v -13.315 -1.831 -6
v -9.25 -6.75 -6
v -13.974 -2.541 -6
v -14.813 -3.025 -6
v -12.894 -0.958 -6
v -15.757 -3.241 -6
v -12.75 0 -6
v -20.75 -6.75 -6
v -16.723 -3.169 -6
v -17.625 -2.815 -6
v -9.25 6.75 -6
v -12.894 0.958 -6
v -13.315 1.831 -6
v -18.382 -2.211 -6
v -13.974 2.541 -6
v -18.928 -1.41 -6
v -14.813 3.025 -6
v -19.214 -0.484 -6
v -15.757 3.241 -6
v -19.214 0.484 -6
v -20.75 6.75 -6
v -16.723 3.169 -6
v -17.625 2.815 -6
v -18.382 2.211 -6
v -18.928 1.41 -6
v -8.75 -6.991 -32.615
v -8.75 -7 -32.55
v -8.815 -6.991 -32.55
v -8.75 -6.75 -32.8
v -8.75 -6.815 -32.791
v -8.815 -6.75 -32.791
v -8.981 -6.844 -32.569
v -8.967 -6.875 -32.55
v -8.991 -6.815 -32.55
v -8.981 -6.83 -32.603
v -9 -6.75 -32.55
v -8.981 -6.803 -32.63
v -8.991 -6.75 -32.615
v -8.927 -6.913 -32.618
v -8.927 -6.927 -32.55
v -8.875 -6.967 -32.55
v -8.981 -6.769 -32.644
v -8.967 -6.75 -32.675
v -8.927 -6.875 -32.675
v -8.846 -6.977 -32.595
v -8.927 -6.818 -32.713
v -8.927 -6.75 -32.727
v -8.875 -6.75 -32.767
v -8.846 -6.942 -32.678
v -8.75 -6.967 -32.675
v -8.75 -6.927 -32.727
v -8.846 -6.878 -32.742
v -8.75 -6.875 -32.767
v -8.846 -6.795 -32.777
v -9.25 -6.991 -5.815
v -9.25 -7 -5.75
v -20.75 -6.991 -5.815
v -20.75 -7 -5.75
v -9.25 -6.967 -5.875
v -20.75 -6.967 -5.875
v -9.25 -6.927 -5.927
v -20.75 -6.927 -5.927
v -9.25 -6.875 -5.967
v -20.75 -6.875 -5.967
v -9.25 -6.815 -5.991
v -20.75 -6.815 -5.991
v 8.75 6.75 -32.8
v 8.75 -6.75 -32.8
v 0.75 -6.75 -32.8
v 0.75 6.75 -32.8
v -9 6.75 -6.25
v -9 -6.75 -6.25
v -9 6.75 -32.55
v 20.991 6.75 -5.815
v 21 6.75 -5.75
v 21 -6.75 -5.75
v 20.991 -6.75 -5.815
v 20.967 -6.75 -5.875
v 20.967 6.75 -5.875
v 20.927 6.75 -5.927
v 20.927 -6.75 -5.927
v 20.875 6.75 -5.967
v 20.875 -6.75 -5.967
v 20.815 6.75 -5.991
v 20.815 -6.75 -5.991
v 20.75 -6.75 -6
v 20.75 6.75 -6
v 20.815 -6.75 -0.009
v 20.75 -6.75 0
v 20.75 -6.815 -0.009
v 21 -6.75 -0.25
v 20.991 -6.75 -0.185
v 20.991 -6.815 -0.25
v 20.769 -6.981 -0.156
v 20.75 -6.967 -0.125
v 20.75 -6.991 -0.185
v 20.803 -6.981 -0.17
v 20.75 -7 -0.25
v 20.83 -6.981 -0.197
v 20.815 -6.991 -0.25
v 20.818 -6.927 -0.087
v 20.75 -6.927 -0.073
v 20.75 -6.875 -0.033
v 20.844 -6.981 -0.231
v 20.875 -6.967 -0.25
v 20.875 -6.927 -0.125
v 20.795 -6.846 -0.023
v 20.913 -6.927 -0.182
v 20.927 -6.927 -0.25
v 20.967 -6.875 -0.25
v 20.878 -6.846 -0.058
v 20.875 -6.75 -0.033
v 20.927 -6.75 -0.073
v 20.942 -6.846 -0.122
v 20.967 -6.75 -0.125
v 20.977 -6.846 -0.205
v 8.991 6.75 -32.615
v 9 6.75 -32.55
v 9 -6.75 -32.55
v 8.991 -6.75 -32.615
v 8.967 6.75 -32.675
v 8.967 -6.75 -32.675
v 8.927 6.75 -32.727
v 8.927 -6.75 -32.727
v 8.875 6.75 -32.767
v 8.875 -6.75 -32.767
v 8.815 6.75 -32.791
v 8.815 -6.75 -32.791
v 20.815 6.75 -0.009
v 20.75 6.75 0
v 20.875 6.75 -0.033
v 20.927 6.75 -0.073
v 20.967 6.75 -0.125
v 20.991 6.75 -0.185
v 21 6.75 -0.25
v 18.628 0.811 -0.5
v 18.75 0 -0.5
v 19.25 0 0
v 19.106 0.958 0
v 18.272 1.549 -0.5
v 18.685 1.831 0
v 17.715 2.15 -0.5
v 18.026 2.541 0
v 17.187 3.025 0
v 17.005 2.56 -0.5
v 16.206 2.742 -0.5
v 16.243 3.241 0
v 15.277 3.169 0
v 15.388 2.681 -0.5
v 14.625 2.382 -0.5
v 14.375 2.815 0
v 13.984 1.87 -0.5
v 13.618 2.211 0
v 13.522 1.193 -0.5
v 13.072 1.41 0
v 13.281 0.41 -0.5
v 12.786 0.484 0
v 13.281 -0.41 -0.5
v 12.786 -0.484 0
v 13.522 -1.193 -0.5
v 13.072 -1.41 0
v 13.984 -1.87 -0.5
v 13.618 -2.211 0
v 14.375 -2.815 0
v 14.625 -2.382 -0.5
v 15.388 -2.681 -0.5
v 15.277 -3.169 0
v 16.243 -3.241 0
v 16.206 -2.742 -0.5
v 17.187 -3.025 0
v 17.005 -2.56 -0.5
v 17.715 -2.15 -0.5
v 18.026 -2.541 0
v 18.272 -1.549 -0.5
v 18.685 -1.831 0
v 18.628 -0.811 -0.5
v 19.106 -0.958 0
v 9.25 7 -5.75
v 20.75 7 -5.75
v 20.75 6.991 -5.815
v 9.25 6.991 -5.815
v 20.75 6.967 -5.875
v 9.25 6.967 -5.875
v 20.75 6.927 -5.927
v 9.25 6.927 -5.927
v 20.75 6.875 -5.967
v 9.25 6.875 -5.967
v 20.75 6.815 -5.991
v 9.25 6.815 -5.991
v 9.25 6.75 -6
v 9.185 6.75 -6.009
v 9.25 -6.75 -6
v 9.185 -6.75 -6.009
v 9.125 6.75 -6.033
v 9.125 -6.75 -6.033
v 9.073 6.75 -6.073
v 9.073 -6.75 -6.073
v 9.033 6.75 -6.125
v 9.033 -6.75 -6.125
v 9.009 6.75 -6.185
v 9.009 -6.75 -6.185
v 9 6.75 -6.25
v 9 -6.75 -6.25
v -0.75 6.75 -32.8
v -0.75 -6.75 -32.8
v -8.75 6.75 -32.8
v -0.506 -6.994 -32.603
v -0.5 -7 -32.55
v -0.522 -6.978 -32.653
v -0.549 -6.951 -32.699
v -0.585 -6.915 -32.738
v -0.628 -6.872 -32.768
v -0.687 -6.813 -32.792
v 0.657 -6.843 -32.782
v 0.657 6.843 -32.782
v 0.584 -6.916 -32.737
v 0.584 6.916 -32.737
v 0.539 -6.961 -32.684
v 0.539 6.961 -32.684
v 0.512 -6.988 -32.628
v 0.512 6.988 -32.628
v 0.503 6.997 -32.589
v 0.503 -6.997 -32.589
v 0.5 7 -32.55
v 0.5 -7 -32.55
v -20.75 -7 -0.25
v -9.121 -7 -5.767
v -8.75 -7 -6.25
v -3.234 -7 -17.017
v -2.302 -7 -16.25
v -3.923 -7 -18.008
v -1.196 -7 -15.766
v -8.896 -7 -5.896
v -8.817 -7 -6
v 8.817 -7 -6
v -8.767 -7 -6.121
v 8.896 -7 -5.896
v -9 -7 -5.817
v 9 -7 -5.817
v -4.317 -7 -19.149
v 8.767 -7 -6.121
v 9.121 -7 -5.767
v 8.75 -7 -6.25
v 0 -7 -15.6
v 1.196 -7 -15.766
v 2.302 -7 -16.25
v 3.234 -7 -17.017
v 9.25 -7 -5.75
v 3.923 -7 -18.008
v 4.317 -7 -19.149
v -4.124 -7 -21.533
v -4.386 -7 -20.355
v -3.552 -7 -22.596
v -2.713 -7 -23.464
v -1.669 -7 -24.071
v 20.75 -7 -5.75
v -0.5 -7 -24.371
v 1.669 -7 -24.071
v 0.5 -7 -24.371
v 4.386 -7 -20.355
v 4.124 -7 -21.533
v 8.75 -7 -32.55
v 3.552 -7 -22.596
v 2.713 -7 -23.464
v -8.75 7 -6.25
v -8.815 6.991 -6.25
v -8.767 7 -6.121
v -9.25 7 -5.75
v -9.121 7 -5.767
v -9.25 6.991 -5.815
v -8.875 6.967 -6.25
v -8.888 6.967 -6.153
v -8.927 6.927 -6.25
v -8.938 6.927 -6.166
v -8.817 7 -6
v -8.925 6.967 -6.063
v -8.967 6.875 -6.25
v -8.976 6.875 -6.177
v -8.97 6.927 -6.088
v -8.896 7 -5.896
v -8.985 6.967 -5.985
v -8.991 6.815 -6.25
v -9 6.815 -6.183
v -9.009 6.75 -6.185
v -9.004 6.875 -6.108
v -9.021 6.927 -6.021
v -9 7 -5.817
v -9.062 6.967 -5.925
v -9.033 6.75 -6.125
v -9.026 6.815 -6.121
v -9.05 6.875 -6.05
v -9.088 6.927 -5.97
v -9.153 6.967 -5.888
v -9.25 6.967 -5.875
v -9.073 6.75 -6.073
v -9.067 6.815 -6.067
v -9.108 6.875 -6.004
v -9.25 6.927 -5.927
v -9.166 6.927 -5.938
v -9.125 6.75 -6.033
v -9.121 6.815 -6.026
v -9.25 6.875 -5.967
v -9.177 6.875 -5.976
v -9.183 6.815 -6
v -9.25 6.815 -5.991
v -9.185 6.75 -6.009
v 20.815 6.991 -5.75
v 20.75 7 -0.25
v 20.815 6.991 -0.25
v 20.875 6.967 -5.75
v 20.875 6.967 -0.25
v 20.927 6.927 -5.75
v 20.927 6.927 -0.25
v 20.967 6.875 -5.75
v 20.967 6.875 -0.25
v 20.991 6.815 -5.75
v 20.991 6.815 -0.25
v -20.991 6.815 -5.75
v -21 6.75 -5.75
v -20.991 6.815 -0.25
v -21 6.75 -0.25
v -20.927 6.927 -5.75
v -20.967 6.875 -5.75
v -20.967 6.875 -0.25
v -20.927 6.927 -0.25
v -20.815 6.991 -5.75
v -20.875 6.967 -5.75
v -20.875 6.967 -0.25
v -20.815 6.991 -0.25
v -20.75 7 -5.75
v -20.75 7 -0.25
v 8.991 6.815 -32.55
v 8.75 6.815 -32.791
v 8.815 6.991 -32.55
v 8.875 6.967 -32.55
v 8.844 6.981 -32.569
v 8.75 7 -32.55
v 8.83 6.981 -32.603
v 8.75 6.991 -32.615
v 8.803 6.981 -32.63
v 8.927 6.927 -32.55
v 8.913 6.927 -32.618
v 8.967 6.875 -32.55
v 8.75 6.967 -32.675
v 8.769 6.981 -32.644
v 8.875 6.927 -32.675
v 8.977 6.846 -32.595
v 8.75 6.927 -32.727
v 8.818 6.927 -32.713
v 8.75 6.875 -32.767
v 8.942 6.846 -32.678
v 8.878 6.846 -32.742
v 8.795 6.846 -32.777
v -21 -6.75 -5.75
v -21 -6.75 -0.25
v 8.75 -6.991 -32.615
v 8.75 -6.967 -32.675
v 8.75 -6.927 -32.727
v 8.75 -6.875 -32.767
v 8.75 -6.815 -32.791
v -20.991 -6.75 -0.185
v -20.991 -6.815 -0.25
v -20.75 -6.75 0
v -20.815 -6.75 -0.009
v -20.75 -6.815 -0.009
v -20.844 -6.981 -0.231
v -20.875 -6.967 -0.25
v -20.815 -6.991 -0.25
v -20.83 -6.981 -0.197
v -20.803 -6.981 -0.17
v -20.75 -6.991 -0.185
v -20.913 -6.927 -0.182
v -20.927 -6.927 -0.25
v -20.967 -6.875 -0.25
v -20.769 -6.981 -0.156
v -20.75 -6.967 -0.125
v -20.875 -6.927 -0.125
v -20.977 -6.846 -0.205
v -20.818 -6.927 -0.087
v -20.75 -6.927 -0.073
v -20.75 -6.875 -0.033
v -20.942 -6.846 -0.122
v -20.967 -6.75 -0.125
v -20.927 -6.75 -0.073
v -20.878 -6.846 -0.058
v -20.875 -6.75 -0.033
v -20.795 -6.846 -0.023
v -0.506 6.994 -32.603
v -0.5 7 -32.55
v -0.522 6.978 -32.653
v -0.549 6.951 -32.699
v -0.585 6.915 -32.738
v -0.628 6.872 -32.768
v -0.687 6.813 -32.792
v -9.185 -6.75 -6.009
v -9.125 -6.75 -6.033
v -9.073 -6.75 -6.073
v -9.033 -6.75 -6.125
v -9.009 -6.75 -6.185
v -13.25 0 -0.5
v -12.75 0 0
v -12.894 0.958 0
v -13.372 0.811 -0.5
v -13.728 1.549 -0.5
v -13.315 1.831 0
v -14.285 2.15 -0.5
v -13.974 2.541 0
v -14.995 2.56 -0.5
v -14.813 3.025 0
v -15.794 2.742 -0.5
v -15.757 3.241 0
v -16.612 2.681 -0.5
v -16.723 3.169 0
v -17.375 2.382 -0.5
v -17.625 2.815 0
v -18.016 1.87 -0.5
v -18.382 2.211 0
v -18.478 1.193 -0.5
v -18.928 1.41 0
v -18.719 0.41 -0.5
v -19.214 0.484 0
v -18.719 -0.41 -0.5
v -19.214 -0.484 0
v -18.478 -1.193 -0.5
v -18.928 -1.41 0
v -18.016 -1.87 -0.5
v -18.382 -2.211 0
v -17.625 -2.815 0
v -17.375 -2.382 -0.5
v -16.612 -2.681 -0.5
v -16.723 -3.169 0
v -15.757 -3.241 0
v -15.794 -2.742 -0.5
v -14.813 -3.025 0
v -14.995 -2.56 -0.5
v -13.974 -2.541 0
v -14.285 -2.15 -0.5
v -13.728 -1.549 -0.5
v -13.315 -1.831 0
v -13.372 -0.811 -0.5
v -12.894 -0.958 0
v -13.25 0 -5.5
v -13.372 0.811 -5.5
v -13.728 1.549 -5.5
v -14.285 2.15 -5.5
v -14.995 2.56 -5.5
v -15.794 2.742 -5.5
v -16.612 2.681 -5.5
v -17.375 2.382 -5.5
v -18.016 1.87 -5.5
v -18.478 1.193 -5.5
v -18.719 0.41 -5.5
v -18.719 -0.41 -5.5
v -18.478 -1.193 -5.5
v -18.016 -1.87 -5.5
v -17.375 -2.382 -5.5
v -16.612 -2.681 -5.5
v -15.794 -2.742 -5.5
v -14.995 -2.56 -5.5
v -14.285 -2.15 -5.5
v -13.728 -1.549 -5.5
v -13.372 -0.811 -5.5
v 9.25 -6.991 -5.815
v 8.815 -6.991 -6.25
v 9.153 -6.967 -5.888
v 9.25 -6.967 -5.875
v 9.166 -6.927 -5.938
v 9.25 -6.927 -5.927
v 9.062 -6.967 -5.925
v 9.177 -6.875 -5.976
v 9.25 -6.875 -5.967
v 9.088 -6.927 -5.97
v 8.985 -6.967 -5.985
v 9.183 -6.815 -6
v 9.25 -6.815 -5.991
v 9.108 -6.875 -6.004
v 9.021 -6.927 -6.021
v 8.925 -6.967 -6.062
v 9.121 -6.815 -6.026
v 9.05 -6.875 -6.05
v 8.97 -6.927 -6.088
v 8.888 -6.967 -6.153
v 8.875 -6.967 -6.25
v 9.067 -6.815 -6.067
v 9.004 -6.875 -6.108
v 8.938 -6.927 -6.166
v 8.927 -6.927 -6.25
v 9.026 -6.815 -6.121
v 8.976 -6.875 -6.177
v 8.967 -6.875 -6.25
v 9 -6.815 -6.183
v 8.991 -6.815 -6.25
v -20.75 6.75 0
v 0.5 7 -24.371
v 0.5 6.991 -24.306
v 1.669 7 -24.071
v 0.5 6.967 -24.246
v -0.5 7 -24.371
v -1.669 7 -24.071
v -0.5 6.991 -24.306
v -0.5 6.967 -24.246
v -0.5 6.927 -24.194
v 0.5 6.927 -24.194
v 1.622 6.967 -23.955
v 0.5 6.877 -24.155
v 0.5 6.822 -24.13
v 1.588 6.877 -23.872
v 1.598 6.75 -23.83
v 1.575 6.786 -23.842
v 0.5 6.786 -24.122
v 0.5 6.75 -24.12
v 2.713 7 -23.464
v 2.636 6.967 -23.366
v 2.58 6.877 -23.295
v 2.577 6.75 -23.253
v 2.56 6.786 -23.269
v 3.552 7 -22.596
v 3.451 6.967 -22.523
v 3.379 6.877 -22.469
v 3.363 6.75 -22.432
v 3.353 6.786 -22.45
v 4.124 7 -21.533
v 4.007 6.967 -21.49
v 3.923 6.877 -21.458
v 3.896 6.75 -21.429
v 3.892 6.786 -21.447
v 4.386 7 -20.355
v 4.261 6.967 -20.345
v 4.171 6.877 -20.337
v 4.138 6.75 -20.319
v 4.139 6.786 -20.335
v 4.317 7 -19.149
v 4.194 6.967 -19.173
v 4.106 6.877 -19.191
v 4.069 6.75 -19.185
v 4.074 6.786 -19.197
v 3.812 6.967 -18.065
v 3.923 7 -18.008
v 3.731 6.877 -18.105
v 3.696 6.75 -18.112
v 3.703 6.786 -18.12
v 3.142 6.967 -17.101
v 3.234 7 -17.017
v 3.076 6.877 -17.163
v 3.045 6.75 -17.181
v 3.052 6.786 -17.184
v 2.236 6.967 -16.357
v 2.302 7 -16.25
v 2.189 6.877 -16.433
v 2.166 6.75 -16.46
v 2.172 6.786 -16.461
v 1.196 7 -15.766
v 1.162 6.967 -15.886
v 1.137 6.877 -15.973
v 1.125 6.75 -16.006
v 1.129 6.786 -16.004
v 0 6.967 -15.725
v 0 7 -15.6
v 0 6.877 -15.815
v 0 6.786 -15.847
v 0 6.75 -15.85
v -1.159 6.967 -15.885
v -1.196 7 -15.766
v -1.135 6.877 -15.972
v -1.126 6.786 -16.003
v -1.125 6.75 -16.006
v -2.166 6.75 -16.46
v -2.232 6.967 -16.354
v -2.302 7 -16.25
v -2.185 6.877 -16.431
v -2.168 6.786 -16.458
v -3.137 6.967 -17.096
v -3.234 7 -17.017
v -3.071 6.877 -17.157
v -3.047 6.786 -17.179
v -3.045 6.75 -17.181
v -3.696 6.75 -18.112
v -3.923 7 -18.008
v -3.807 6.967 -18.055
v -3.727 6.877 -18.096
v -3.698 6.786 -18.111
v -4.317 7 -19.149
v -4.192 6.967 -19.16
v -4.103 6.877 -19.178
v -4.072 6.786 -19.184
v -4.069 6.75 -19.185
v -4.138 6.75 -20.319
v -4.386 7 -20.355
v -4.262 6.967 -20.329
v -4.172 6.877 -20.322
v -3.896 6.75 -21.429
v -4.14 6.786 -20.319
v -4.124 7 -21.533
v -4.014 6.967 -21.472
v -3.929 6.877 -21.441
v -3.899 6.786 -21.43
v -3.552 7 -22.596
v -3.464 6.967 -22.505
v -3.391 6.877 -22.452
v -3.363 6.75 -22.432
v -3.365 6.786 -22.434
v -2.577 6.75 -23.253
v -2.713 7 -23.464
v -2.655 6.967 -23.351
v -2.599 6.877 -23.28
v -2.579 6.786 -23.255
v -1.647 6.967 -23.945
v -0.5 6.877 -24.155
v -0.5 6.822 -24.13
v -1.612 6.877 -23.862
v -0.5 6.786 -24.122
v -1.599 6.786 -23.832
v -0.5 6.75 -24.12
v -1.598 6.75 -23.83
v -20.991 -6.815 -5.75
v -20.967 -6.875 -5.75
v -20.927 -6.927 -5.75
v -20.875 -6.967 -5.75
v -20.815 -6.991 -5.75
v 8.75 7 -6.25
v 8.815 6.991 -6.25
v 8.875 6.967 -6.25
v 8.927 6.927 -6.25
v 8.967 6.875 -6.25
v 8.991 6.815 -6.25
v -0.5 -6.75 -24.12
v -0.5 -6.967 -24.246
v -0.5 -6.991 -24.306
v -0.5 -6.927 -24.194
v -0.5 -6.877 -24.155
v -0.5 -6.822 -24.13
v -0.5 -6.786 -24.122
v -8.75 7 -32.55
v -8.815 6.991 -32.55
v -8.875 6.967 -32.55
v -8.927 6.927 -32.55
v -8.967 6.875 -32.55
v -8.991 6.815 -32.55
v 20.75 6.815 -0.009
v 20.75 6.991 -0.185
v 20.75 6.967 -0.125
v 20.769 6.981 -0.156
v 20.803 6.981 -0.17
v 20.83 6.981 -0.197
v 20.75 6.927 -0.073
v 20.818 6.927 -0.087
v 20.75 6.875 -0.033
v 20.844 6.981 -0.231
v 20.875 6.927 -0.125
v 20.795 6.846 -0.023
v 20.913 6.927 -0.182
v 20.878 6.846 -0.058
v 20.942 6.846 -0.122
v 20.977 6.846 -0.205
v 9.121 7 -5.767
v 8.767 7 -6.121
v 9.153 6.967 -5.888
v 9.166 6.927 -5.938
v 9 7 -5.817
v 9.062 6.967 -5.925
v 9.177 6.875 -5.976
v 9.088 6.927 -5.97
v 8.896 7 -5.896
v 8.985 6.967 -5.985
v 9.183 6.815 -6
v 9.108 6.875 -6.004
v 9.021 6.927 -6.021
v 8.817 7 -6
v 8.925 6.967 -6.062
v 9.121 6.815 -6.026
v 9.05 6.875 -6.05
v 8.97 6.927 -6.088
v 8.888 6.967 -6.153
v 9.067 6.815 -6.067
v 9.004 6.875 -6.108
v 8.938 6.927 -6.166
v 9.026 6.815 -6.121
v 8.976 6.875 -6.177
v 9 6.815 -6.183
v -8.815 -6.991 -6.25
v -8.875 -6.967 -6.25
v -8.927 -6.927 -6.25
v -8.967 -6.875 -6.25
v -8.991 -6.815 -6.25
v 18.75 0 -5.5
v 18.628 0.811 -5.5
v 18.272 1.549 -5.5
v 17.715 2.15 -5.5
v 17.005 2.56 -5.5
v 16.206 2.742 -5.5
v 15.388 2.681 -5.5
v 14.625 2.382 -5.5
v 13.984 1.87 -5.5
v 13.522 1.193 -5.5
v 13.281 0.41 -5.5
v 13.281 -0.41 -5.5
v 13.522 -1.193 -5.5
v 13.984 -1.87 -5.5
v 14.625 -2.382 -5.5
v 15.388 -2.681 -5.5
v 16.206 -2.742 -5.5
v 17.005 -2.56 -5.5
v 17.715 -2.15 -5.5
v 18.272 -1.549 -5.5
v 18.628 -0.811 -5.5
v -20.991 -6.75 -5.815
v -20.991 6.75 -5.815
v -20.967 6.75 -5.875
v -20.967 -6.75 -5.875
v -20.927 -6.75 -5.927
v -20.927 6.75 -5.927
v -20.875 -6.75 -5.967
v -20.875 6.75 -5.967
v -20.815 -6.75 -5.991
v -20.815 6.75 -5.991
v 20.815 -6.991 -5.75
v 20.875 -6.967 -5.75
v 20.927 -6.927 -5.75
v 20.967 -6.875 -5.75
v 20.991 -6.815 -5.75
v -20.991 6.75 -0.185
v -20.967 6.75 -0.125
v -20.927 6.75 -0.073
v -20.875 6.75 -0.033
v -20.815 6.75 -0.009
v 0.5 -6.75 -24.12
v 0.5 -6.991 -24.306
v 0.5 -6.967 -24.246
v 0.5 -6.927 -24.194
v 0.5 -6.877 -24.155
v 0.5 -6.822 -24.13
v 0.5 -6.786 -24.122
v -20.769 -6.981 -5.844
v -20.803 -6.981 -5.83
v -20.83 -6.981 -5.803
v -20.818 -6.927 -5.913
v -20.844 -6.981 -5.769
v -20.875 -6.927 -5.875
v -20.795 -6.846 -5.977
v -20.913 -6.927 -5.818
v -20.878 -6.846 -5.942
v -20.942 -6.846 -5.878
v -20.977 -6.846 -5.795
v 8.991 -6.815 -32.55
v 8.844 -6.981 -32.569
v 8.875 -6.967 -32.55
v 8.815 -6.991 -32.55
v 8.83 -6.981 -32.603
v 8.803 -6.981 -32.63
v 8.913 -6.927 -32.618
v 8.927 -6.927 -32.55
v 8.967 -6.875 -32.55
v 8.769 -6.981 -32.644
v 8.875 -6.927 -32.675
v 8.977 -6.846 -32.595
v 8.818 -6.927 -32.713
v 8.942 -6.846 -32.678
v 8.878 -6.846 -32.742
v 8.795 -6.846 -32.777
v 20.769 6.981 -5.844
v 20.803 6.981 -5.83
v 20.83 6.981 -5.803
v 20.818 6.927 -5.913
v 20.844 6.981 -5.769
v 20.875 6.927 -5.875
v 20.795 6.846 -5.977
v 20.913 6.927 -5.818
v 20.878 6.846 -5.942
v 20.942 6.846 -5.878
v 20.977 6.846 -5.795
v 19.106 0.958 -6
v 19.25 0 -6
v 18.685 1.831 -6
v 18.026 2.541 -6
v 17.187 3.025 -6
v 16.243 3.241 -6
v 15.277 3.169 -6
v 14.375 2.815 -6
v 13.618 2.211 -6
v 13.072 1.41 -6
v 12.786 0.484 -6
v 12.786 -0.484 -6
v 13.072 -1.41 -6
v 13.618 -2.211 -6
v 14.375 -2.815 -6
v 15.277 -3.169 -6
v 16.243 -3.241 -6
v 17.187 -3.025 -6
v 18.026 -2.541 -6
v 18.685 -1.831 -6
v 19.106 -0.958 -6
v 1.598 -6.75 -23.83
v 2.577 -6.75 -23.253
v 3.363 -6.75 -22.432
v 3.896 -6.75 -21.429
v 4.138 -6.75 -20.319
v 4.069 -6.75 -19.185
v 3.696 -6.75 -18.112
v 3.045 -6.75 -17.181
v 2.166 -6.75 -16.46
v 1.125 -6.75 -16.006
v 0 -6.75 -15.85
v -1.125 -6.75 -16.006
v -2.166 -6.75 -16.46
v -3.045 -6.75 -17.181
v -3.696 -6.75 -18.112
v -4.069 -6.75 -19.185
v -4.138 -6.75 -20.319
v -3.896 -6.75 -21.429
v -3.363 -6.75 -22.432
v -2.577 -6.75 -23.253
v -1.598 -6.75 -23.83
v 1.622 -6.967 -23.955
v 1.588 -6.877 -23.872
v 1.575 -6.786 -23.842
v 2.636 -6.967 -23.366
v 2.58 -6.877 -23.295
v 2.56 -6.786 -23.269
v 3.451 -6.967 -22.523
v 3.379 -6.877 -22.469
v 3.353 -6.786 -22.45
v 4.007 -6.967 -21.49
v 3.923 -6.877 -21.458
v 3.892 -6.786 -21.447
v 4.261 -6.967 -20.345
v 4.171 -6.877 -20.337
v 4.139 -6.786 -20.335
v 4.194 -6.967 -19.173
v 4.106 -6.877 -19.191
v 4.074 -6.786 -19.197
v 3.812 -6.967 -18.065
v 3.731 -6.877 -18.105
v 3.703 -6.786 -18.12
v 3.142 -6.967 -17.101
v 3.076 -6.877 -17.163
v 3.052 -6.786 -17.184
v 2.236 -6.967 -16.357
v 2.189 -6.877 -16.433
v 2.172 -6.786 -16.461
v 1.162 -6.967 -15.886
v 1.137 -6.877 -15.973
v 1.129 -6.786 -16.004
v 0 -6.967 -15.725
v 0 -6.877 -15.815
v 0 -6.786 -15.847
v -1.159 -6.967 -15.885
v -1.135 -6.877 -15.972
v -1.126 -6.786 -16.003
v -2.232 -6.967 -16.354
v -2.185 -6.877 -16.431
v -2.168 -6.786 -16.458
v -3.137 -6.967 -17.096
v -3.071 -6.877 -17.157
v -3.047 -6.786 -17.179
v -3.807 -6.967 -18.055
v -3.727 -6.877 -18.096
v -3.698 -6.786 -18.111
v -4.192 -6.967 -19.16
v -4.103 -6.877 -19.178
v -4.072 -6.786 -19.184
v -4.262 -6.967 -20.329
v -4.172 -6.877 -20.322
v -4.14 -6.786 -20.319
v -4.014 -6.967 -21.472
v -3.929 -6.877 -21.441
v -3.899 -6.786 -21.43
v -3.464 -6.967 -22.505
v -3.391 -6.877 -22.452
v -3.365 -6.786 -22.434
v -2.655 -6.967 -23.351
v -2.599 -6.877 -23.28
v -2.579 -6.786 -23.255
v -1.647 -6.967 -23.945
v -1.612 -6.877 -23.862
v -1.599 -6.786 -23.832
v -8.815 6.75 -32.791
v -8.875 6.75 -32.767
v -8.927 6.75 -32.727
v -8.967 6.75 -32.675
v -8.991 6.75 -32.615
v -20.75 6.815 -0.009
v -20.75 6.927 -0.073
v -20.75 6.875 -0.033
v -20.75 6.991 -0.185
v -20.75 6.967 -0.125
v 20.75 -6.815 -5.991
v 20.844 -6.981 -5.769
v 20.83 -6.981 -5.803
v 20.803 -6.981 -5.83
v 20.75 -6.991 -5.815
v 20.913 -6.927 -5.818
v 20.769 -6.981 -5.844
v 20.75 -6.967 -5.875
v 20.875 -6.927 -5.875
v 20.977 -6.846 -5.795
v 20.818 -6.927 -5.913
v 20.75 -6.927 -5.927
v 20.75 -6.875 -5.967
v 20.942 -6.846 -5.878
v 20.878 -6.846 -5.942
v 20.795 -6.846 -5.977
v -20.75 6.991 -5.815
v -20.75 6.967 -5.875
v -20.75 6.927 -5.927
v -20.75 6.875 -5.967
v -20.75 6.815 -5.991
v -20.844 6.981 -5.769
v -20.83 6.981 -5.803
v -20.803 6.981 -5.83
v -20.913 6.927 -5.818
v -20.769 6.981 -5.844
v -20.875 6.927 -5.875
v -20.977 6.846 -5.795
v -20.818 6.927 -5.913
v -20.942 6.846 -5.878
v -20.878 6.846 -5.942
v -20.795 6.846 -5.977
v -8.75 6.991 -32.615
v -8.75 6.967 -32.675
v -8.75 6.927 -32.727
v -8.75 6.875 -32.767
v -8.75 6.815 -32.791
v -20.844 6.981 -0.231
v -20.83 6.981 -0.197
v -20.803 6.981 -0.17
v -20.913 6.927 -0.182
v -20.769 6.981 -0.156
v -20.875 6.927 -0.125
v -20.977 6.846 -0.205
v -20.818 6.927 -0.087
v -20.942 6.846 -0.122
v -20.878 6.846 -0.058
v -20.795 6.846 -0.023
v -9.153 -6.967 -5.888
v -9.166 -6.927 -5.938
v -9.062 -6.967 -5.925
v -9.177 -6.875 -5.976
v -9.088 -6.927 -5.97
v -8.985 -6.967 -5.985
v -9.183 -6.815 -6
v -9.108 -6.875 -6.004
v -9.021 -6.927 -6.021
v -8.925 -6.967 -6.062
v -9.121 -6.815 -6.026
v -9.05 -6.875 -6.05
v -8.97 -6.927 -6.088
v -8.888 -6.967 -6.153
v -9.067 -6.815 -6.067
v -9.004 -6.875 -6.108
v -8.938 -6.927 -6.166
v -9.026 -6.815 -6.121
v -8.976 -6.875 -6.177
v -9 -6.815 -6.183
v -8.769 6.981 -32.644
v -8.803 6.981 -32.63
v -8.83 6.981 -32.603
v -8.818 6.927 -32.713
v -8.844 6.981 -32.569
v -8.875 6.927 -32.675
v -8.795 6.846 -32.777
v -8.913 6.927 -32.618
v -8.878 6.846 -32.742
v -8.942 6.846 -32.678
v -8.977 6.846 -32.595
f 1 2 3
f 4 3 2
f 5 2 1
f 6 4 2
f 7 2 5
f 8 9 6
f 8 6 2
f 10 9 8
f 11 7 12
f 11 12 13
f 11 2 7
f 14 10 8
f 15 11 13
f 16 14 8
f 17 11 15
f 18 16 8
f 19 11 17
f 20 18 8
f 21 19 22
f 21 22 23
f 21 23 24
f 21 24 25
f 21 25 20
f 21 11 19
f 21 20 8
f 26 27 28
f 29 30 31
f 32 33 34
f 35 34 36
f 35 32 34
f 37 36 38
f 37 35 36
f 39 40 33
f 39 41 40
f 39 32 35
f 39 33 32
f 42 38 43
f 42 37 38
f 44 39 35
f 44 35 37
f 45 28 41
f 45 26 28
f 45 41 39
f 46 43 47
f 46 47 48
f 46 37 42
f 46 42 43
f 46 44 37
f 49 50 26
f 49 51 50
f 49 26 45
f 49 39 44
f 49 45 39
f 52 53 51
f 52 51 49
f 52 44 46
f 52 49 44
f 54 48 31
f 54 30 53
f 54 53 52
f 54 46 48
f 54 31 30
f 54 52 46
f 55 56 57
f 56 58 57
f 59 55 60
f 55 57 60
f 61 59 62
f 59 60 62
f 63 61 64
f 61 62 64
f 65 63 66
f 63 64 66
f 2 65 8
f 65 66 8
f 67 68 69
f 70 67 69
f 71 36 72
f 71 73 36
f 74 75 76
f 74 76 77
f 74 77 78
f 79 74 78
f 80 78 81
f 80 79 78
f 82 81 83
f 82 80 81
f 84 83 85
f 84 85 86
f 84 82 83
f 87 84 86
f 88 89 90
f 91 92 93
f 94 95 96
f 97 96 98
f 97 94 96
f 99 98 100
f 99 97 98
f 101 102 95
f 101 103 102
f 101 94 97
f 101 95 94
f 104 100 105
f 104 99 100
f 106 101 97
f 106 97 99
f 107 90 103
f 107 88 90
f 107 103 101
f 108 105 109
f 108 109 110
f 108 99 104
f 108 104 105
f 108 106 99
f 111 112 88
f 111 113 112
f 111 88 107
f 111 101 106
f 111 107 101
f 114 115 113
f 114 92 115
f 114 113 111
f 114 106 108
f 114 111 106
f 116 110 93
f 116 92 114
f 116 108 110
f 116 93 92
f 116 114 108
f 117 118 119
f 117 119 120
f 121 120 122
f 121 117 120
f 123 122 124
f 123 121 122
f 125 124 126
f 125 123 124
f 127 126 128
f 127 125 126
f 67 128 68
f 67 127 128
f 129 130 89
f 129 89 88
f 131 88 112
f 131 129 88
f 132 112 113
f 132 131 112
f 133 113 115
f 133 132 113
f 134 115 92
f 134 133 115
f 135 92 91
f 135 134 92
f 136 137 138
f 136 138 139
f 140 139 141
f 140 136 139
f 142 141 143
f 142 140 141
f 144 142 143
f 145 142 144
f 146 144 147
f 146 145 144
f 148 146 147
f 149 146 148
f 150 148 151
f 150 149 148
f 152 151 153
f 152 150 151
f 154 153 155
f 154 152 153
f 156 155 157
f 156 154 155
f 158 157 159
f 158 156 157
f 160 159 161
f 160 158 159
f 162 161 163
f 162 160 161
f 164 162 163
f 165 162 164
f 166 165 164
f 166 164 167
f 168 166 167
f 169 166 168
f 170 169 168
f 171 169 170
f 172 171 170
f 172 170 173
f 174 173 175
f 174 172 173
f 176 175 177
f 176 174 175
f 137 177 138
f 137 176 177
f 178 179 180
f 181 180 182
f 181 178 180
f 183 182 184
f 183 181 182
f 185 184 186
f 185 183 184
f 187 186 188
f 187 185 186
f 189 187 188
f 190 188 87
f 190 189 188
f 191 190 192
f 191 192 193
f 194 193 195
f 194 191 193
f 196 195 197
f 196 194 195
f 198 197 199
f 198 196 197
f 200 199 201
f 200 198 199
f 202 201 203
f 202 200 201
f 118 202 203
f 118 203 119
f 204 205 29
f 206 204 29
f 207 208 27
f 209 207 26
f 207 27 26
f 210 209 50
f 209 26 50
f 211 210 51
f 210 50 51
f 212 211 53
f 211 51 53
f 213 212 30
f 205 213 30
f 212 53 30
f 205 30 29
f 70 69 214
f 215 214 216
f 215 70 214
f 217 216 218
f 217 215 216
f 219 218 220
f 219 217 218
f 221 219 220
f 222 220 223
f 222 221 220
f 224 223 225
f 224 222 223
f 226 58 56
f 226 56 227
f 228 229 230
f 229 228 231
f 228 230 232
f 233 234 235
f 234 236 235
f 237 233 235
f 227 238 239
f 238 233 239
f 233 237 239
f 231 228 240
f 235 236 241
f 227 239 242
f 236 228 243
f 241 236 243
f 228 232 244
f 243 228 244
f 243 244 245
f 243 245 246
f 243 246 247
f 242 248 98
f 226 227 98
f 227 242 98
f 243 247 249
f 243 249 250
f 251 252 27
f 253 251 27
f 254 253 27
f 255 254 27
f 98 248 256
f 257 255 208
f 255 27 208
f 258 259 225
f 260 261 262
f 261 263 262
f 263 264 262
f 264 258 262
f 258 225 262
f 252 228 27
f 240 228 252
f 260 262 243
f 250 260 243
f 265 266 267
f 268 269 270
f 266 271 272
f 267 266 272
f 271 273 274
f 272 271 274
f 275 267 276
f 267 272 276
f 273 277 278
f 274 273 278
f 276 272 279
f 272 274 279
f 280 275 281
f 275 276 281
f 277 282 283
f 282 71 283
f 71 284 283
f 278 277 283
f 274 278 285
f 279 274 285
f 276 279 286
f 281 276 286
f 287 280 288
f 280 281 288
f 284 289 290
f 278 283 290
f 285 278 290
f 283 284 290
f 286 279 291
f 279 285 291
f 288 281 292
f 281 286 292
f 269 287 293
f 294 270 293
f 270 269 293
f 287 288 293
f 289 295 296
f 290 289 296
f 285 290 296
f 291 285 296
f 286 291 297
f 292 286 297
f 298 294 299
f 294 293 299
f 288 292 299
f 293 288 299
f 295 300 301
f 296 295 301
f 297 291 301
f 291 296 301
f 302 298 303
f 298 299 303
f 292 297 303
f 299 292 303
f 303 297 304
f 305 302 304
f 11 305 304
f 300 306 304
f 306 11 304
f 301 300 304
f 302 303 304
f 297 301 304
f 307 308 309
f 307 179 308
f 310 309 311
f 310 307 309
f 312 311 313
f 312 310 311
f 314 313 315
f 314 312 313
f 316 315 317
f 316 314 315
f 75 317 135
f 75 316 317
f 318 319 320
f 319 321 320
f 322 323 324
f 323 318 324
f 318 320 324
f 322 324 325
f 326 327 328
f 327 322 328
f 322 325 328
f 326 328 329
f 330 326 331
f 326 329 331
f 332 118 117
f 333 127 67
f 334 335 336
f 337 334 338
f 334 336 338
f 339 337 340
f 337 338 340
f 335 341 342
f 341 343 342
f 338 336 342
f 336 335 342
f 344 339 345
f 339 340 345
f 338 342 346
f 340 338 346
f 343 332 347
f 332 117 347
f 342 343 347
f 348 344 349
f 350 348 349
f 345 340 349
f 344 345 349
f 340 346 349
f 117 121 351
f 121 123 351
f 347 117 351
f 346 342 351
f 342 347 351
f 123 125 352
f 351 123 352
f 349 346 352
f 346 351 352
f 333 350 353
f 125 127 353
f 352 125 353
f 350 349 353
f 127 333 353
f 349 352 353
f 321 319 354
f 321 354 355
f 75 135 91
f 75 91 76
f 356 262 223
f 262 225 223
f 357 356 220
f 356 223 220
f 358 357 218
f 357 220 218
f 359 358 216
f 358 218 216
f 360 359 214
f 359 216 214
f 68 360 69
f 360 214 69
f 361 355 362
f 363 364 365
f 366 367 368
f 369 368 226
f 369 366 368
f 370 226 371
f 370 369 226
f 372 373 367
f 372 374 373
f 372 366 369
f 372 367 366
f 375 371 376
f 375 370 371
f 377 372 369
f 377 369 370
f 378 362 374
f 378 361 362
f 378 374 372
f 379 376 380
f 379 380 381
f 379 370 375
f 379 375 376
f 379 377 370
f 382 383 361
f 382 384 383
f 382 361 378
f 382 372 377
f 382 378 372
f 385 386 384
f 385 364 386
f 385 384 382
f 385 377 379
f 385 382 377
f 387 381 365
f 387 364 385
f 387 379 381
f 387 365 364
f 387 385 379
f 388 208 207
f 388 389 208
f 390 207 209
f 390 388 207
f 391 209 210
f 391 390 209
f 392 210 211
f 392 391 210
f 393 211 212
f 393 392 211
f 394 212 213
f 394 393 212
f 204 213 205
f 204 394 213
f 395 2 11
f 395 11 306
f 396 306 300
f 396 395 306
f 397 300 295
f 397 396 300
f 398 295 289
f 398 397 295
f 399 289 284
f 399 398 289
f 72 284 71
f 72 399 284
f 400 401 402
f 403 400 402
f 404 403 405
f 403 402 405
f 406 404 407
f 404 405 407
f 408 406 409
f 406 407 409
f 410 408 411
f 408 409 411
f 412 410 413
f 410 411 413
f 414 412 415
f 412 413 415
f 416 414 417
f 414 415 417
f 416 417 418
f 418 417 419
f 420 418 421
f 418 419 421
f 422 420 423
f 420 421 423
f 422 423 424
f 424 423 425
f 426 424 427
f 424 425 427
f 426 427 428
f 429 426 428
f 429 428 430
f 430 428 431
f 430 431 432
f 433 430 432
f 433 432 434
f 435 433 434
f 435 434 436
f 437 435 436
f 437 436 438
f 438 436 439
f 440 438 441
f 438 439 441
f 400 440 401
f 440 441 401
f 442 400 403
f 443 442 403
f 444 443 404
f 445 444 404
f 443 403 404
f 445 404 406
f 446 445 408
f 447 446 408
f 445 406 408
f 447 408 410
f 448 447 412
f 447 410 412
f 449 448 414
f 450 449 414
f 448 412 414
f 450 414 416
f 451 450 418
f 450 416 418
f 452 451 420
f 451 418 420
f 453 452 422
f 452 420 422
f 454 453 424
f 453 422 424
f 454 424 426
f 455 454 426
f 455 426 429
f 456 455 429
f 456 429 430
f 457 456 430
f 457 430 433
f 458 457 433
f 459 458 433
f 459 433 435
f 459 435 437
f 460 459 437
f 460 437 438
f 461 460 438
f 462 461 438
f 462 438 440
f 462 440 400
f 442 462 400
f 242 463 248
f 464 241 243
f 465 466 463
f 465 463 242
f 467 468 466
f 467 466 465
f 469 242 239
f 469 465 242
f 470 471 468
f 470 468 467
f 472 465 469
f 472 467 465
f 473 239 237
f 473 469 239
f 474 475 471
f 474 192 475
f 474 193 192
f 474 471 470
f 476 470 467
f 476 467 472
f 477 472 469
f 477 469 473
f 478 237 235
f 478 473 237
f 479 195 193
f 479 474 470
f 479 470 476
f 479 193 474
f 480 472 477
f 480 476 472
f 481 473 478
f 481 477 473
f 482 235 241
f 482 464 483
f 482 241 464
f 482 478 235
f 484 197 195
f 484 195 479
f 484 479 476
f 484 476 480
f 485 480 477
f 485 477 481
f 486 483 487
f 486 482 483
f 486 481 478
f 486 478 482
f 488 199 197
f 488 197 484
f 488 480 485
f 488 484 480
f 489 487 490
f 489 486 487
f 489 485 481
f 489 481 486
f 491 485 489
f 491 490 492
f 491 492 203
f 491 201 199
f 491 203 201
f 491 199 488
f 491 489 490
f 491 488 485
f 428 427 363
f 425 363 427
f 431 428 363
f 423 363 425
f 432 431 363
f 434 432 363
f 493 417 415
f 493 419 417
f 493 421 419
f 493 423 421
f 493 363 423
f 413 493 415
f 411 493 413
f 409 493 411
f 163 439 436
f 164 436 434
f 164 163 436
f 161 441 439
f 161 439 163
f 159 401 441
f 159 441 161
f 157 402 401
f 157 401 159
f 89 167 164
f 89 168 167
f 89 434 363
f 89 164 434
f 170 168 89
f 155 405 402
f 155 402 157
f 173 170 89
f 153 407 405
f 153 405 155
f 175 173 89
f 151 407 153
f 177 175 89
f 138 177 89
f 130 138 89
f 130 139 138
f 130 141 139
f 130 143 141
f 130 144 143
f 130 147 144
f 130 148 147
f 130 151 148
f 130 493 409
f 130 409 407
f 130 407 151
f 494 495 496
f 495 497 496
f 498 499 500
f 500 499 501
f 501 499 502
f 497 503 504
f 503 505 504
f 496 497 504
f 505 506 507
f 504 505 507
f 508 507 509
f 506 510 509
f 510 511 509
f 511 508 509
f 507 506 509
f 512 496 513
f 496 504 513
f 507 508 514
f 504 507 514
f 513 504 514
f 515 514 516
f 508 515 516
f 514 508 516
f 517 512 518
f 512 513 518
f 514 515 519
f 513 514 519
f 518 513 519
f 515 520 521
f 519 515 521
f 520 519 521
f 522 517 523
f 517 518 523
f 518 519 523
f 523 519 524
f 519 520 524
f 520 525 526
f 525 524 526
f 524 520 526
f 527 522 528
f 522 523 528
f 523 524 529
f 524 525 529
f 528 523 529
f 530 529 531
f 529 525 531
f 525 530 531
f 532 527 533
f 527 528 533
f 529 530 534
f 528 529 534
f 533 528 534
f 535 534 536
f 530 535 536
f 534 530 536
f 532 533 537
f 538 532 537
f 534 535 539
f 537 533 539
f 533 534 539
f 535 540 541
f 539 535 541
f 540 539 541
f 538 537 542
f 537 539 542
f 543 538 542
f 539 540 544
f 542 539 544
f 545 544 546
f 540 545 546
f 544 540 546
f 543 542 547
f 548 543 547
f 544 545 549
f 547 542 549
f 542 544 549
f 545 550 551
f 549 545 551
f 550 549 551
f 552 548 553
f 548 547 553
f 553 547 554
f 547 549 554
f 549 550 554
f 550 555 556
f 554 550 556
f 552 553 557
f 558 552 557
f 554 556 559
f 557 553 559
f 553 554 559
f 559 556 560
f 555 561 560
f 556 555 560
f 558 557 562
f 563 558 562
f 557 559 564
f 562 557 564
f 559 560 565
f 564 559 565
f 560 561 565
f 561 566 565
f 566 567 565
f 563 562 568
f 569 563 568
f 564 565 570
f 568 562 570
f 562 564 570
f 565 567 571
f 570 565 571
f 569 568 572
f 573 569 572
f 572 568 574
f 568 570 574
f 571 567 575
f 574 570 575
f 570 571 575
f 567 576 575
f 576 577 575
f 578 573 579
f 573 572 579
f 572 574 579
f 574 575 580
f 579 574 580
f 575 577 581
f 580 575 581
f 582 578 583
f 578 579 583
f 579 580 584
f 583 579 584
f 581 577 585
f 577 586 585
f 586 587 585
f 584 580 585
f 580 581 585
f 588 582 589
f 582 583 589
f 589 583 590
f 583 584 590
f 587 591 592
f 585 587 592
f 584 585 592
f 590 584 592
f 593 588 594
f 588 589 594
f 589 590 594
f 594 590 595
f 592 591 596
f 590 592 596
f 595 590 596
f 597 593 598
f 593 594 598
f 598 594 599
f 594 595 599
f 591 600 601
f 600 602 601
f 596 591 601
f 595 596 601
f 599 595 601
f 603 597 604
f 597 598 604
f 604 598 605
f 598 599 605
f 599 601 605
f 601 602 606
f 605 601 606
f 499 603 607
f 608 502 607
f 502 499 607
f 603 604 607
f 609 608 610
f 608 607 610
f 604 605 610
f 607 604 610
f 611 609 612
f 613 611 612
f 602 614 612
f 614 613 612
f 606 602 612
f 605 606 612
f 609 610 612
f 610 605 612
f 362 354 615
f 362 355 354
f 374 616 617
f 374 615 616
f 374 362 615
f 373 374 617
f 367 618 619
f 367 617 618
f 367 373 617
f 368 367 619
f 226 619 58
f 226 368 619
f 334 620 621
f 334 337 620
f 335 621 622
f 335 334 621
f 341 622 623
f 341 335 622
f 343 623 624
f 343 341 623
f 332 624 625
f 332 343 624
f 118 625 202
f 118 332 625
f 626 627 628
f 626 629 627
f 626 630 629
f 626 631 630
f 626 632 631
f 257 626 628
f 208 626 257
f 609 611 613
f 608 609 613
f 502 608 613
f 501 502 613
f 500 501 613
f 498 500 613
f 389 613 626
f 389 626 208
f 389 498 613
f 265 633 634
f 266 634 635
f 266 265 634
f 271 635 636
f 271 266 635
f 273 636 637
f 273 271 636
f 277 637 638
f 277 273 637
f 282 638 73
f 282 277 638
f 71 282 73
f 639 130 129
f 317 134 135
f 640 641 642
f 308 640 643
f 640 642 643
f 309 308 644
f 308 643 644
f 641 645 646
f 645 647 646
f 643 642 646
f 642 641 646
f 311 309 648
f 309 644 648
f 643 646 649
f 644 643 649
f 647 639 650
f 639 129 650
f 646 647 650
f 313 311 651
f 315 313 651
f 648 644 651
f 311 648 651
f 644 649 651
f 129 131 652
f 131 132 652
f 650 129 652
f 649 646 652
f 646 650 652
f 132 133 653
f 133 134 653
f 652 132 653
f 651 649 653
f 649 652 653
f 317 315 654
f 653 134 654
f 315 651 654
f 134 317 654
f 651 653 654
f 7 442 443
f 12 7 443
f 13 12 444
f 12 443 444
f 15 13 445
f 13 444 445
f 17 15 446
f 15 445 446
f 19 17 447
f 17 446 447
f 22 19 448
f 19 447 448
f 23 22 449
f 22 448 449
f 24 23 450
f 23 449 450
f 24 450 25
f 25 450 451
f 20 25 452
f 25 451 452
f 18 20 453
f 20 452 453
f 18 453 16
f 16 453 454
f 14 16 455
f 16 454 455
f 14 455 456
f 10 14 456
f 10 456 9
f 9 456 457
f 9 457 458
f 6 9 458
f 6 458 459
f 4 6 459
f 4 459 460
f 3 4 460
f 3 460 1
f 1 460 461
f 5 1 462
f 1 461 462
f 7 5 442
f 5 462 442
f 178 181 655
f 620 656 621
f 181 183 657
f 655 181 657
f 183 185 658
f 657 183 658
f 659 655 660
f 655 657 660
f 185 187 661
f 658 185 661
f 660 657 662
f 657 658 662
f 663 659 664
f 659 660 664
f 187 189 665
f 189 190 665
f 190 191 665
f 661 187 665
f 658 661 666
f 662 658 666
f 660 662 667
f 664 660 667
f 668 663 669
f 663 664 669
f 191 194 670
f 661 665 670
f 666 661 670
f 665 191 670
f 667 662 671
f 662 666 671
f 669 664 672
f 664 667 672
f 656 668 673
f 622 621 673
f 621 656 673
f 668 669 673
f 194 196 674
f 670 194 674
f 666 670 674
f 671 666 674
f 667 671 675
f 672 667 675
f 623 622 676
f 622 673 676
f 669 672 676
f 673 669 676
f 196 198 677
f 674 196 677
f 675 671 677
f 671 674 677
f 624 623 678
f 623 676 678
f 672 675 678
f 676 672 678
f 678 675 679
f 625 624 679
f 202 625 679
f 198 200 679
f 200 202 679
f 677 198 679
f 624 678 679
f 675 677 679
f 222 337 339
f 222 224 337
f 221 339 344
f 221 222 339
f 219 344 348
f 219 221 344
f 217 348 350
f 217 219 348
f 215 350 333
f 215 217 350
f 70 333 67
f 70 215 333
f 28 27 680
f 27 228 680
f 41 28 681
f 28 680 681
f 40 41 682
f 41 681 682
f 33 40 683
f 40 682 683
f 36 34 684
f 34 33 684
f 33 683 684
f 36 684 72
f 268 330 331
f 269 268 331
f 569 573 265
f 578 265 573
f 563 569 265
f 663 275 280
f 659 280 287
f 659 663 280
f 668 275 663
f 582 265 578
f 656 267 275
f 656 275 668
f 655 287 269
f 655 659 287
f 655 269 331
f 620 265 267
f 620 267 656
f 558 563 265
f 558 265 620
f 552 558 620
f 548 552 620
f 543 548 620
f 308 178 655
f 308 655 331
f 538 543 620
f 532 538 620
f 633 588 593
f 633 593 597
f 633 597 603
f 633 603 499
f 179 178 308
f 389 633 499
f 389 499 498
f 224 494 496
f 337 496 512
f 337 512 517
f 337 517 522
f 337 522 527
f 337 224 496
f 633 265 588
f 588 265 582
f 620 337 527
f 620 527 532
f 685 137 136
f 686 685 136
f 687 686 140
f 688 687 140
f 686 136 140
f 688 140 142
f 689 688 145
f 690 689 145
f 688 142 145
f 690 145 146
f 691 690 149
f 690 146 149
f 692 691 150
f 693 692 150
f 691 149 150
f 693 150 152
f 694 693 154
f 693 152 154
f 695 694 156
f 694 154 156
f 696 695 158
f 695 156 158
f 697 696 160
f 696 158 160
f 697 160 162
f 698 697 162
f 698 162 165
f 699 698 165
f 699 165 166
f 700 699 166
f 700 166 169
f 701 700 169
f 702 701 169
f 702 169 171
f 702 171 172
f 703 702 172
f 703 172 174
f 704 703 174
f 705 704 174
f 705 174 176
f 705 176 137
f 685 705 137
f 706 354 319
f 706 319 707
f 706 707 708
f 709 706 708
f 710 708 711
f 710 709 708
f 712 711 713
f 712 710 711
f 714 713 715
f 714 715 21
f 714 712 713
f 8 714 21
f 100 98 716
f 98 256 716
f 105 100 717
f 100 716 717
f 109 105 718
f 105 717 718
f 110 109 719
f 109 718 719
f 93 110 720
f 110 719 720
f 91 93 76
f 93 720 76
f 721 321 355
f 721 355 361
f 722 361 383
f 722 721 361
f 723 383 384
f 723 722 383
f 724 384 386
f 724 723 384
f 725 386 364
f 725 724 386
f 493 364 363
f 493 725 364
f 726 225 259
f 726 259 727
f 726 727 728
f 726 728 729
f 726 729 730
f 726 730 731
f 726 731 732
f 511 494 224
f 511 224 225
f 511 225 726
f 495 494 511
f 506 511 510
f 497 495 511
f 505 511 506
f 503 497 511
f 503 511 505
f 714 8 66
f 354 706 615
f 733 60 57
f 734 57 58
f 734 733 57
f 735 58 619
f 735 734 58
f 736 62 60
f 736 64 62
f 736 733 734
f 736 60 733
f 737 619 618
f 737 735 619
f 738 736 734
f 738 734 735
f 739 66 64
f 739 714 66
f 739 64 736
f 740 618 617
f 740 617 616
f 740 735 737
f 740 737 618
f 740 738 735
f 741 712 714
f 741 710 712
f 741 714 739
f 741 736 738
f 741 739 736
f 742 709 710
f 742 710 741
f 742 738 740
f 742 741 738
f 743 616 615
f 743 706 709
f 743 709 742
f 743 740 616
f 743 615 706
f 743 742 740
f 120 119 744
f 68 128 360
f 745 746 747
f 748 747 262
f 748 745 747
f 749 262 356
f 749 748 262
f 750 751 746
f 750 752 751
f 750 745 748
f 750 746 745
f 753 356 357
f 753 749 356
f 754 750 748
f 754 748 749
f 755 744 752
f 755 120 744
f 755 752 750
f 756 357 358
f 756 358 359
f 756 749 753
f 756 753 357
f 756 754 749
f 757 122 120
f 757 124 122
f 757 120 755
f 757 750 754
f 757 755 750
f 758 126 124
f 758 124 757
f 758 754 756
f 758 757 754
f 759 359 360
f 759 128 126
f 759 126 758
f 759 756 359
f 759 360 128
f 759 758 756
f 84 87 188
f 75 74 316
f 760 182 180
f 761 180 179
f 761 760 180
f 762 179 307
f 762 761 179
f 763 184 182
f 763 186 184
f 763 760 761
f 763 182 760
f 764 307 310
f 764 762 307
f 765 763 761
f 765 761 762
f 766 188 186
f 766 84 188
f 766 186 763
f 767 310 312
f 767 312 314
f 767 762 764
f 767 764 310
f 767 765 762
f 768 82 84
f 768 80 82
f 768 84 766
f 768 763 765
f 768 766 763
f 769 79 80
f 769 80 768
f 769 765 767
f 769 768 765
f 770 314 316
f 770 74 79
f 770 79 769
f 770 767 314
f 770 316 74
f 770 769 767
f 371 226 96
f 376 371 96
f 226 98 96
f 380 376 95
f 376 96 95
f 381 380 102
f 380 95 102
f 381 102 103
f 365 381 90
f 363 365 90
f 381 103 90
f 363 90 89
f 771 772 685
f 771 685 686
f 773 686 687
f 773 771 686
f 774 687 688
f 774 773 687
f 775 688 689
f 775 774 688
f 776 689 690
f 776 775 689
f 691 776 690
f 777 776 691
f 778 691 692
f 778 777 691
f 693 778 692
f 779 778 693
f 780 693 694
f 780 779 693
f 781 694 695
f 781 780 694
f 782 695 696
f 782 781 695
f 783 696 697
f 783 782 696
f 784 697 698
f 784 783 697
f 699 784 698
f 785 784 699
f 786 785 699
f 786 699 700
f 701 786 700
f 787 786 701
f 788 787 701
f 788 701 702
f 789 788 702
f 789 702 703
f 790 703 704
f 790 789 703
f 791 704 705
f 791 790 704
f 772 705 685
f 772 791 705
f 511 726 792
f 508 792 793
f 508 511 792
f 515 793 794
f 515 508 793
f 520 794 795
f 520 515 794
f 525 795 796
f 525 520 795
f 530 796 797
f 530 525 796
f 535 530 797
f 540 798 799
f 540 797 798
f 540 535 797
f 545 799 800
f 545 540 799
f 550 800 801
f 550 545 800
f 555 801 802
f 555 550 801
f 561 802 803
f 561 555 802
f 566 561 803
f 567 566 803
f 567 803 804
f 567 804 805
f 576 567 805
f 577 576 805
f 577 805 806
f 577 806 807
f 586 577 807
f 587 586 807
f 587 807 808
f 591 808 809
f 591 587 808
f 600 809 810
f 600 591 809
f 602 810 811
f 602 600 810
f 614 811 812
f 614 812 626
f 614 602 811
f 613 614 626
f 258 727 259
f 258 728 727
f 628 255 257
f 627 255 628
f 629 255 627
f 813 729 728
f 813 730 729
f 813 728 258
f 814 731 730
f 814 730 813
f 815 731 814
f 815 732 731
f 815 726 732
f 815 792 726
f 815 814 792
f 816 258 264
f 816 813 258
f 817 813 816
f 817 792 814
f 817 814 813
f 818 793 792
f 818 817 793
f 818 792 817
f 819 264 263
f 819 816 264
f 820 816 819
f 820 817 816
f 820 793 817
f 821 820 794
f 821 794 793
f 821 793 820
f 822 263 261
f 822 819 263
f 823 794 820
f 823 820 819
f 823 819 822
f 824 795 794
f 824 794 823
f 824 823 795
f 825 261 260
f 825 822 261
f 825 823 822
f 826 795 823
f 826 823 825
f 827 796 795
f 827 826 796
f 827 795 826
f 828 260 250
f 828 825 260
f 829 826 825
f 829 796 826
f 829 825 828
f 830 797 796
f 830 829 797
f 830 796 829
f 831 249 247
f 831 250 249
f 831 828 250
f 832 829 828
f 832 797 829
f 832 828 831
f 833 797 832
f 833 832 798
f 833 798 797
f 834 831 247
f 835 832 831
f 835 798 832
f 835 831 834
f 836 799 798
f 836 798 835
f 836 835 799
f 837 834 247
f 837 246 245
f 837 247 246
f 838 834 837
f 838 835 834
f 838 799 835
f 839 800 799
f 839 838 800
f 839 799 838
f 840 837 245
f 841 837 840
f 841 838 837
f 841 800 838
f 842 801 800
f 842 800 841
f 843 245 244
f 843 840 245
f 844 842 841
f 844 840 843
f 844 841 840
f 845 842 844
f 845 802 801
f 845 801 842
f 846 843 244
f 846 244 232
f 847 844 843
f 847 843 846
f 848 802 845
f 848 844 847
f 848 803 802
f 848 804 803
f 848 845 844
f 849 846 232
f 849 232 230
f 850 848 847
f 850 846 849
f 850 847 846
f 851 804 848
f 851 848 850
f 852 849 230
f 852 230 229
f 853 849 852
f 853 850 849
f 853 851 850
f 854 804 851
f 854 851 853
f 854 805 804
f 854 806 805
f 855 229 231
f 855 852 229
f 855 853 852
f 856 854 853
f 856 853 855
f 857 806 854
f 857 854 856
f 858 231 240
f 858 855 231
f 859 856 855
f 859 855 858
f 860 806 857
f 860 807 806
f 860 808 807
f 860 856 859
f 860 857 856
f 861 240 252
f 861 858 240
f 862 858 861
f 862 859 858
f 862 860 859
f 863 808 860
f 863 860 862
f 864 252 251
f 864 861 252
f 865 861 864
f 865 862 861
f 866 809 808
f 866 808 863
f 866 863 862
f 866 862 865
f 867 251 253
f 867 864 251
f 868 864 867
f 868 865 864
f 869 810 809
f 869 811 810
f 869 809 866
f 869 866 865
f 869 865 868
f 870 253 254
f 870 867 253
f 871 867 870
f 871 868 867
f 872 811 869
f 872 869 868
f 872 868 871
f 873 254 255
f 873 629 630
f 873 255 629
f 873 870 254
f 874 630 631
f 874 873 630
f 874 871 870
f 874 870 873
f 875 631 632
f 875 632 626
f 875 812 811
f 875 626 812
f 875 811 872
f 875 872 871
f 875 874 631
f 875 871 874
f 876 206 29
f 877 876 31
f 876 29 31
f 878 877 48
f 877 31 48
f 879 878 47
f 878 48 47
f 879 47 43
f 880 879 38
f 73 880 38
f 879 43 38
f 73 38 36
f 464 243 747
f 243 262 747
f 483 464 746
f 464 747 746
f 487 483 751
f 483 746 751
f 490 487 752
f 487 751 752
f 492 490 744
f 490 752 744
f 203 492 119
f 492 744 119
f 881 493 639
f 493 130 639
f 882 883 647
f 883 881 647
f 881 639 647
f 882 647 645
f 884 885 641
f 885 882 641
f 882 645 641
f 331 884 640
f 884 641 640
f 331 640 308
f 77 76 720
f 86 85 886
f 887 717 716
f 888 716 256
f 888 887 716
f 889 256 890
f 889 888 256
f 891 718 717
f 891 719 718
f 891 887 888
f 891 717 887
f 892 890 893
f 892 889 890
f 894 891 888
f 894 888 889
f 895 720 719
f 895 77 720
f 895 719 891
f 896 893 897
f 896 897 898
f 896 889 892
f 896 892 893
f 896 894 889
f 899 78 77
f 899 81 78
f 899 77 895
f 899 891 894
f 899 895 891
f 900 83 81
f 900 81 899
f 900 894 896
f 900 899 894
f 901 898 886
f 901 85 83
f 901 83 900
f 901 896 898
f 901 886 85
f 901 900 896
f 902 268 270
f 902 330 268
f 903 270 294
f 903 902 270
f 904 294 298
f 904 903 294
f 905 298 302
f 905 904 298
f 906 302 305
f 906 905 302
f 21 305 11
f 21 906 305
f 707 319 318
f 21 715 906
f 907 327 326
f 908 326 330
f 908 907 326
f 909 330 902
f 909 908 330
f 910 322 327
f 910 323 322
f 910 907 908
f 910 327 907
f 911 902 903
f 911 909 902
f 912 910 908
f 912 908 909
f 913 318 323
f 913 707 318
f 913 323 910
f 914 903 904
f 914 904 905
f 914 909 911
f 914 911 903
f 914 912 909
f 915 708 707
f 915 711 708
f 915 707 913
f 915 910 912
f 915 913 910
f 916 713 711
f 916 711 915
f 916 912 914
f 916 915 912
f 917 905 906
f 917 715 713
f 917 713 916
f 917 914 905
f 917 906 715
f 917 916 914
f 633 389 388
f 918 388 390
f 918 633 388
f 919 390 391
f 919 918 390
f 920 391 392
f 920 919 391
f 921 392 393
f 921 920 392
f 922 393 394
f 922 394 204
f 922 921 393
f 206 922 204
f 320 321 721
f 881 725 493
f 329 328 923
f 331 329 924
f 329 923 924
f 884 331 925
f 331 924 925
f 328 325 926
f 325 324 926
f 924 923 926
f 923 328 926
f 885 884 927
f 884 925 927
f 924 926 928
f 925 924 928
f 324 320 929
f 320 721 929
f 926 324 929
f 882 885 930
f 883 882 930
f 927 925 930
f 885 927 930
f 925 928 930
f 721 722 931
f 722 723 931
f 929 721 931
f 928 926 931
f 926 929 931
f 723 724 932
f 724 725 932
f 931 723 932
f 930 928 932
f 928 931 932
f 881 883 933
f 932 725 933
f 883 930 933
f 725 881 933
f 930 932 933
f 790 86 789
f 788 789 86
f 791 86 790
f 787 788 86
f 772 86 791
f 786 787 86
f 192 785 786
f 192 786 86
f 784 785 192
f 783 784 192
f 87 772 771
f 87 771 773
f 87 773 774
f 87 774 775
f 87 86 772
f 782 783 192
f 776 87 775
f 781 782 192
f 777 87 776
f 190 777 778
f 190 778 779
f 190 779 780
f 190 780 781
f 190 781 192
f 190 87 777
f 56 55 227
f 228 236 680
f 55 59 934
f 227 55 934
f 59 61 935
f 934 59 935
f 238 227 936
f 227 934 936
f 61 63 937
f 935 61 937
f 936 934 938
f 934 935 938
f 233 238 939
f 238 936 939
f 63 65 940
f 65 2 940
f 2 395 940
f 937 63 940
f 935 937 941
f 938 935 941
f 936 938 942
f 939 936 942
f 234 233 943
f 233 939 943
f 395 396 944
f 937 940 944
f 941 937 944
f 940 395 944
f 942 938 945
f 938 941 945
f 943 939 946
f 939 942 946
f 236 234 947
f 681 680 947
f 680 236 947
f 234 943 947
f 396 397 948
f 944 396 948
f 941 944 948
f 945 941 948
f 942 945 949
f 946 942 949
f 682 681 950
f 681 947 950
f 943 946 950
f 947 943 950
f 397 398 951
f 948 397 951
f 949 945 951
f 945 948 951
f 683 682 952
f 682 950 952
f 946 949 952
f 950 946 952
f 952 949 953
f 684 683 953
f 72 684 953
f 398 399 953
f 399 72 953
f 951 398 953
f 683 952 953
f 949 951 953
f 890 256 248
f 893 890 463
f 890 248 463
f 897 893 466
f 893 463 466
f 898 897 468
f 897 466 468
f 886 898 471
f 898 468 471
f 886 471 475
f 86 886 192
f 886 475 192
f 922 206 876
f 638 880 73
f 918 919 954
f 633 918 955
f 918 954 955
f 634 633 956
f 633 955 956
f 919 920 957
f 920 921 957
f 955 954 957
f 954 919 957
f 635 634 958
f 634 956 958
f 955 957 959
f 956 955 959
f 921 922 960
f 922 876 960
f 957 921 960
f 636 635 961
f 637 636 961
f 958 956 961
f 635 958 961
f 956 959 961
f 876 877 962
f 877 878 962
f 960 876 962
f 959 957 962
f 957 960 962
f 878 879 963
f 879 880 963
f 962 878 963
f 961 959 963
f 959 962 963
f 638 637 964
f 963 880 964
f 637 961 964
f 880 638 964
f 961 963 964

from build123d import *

# Parameters (mm, degrees)
BOSS_EXTRUDE1_DEPTH      = 7
BOSS_EXTRUDE1_DEPTH_BACK = 7
CUT_EXTRUDE1_REACH       = 41.571
SKETCH2_R                = 2.75
FILLET1_R                = 0.25
CHAMFER1_SIZE            = 0.5


with BuildPart() as part:
    # Sketch1 → Boss-Extrude1 (new, two sides: drawn at the far end of the back side and taken through both)
    with BuildSketch(Plane(origin=(0, 0, 0), x_dir=(1, 0, 0), z_dir=(0, 1, 0)).offset(-BOSS_EXTRUDE1_DEPTH_BACK)):
        with BuildLine():
            Line((-21, 6), (-21, 0))
            Line((-21, 0), (21, 0))
            Line((21, 0), (21, 6))
            Line((21, 6), (9, 6))
            Line((9, 6), (9, 32.8))
            Line((9, 32.8), (0.5, 32.8))
            Line((0.5, 32.8), (0.5, 24.119769411))
            ThreePointArc((0.5, 24.119769411), (0, 15.85), (-0.5, 24.119769411))
            Line((-0.5, 24.119769411), (-0.5, 32.8))
            Line((-0.5, 32.8), (-9, 32.8))
            Line((-9, 32.8), (-9, 6))
            Line((-9, 6), (-21, 6))
        make_face()
    extrude(amount=BOSS_EXTRUDE1_DEPTH + BOSS_EXTRUDE1_DEPTH_BACK)

    # Sketch2 → Cut-Extrude1 (cut, up to next)
    with BuildSketch(Plane.XY, mode=Mode.PRIVATE) as cut_extrude1_sk1:
        with Locations((-16, 0)):
            Circle(SKETCH2_R)
    cut_extrude1_tool1 = extrude(cut_extrude1_sk1.sketch, amount=-CUT_EXTRUDE1_REACH, mode=Mode.PRIVATE) & part.part
    # Sketch2 → Cut-Extrude1 (cut, up to next)
    with BuildSketch(Plane.XY, mode=Mode.PRIVATE) as cut_extrude1_sk2:
        with Locations((16, 0)):
            Circle(SKETCH2_R)
    cut_extrude1_tool2 = extrude(cut_extrude1_sk2.sketch, amount=-CUT_EXTRUDE1_REACH, mode=Mode.PRIVATE) & part.part
    add(cut_extrude1_tool1.solids().sort_by_distance((-16, 0, 0))[0], mode=Mode.SUBTRACT)
    add(cut_extrude1_tool2.solids().sort_by_distance((16, 0, 0))[0], mode=Mode.SUBTRACT)

    # Fillet1
    fillet1_edges = [part.edges().sort_by_distance(p)[0] for p in [
        (15, -7, -6),
        (15, 7, -6),
        (-9, -7, -19.4),
        (-9, 7, -19.4),
        (9, -7, -19.4),
        (9, 0, -6),
        (9, 7, -19.4),
        (4.75, -7, -32.8),
        (9, 0, -32.8),
        (4.75, 7, -32.8),
        (0.5, 0, -32.8),
        (-4.75, -7, -32.8),
        (-0.5, 0, -32.8),
        (-4.75, 7, -32.8),
        (-9, 0, -32.8),
        (21, 0, 0),
        (-21, 0, 0),
        (0, 7, 0),
        (0, -7, 0),
        (21, -7, -3),
        (-21, -7, -3),
        (-21, 7, -3),
        (21, 7, -3),
        (-15, -7, -6),
        (-21, 0, -6),
        (-15, 7, -6),
        (-9, 0, -6),
        (21, 0, -6),
        (0, -7, -15.85),
        (0, 7, -15.85),
    ]]
    fillet(fillet1_edges, radius=FILLET1_R)

    # Chamfer1
    chamfer1_edges = [part.edges().sort_by_distance(p)[0] for p in [
        (13.25, 0, 0),
        (-18.75, 0, 0),
        (-18.75, 0, -6),
        (13.25, 0, -6),
    ]]
    chamfer(chamfer1_edges, length=CHAMFER1_SIZE)


solid = part.part
